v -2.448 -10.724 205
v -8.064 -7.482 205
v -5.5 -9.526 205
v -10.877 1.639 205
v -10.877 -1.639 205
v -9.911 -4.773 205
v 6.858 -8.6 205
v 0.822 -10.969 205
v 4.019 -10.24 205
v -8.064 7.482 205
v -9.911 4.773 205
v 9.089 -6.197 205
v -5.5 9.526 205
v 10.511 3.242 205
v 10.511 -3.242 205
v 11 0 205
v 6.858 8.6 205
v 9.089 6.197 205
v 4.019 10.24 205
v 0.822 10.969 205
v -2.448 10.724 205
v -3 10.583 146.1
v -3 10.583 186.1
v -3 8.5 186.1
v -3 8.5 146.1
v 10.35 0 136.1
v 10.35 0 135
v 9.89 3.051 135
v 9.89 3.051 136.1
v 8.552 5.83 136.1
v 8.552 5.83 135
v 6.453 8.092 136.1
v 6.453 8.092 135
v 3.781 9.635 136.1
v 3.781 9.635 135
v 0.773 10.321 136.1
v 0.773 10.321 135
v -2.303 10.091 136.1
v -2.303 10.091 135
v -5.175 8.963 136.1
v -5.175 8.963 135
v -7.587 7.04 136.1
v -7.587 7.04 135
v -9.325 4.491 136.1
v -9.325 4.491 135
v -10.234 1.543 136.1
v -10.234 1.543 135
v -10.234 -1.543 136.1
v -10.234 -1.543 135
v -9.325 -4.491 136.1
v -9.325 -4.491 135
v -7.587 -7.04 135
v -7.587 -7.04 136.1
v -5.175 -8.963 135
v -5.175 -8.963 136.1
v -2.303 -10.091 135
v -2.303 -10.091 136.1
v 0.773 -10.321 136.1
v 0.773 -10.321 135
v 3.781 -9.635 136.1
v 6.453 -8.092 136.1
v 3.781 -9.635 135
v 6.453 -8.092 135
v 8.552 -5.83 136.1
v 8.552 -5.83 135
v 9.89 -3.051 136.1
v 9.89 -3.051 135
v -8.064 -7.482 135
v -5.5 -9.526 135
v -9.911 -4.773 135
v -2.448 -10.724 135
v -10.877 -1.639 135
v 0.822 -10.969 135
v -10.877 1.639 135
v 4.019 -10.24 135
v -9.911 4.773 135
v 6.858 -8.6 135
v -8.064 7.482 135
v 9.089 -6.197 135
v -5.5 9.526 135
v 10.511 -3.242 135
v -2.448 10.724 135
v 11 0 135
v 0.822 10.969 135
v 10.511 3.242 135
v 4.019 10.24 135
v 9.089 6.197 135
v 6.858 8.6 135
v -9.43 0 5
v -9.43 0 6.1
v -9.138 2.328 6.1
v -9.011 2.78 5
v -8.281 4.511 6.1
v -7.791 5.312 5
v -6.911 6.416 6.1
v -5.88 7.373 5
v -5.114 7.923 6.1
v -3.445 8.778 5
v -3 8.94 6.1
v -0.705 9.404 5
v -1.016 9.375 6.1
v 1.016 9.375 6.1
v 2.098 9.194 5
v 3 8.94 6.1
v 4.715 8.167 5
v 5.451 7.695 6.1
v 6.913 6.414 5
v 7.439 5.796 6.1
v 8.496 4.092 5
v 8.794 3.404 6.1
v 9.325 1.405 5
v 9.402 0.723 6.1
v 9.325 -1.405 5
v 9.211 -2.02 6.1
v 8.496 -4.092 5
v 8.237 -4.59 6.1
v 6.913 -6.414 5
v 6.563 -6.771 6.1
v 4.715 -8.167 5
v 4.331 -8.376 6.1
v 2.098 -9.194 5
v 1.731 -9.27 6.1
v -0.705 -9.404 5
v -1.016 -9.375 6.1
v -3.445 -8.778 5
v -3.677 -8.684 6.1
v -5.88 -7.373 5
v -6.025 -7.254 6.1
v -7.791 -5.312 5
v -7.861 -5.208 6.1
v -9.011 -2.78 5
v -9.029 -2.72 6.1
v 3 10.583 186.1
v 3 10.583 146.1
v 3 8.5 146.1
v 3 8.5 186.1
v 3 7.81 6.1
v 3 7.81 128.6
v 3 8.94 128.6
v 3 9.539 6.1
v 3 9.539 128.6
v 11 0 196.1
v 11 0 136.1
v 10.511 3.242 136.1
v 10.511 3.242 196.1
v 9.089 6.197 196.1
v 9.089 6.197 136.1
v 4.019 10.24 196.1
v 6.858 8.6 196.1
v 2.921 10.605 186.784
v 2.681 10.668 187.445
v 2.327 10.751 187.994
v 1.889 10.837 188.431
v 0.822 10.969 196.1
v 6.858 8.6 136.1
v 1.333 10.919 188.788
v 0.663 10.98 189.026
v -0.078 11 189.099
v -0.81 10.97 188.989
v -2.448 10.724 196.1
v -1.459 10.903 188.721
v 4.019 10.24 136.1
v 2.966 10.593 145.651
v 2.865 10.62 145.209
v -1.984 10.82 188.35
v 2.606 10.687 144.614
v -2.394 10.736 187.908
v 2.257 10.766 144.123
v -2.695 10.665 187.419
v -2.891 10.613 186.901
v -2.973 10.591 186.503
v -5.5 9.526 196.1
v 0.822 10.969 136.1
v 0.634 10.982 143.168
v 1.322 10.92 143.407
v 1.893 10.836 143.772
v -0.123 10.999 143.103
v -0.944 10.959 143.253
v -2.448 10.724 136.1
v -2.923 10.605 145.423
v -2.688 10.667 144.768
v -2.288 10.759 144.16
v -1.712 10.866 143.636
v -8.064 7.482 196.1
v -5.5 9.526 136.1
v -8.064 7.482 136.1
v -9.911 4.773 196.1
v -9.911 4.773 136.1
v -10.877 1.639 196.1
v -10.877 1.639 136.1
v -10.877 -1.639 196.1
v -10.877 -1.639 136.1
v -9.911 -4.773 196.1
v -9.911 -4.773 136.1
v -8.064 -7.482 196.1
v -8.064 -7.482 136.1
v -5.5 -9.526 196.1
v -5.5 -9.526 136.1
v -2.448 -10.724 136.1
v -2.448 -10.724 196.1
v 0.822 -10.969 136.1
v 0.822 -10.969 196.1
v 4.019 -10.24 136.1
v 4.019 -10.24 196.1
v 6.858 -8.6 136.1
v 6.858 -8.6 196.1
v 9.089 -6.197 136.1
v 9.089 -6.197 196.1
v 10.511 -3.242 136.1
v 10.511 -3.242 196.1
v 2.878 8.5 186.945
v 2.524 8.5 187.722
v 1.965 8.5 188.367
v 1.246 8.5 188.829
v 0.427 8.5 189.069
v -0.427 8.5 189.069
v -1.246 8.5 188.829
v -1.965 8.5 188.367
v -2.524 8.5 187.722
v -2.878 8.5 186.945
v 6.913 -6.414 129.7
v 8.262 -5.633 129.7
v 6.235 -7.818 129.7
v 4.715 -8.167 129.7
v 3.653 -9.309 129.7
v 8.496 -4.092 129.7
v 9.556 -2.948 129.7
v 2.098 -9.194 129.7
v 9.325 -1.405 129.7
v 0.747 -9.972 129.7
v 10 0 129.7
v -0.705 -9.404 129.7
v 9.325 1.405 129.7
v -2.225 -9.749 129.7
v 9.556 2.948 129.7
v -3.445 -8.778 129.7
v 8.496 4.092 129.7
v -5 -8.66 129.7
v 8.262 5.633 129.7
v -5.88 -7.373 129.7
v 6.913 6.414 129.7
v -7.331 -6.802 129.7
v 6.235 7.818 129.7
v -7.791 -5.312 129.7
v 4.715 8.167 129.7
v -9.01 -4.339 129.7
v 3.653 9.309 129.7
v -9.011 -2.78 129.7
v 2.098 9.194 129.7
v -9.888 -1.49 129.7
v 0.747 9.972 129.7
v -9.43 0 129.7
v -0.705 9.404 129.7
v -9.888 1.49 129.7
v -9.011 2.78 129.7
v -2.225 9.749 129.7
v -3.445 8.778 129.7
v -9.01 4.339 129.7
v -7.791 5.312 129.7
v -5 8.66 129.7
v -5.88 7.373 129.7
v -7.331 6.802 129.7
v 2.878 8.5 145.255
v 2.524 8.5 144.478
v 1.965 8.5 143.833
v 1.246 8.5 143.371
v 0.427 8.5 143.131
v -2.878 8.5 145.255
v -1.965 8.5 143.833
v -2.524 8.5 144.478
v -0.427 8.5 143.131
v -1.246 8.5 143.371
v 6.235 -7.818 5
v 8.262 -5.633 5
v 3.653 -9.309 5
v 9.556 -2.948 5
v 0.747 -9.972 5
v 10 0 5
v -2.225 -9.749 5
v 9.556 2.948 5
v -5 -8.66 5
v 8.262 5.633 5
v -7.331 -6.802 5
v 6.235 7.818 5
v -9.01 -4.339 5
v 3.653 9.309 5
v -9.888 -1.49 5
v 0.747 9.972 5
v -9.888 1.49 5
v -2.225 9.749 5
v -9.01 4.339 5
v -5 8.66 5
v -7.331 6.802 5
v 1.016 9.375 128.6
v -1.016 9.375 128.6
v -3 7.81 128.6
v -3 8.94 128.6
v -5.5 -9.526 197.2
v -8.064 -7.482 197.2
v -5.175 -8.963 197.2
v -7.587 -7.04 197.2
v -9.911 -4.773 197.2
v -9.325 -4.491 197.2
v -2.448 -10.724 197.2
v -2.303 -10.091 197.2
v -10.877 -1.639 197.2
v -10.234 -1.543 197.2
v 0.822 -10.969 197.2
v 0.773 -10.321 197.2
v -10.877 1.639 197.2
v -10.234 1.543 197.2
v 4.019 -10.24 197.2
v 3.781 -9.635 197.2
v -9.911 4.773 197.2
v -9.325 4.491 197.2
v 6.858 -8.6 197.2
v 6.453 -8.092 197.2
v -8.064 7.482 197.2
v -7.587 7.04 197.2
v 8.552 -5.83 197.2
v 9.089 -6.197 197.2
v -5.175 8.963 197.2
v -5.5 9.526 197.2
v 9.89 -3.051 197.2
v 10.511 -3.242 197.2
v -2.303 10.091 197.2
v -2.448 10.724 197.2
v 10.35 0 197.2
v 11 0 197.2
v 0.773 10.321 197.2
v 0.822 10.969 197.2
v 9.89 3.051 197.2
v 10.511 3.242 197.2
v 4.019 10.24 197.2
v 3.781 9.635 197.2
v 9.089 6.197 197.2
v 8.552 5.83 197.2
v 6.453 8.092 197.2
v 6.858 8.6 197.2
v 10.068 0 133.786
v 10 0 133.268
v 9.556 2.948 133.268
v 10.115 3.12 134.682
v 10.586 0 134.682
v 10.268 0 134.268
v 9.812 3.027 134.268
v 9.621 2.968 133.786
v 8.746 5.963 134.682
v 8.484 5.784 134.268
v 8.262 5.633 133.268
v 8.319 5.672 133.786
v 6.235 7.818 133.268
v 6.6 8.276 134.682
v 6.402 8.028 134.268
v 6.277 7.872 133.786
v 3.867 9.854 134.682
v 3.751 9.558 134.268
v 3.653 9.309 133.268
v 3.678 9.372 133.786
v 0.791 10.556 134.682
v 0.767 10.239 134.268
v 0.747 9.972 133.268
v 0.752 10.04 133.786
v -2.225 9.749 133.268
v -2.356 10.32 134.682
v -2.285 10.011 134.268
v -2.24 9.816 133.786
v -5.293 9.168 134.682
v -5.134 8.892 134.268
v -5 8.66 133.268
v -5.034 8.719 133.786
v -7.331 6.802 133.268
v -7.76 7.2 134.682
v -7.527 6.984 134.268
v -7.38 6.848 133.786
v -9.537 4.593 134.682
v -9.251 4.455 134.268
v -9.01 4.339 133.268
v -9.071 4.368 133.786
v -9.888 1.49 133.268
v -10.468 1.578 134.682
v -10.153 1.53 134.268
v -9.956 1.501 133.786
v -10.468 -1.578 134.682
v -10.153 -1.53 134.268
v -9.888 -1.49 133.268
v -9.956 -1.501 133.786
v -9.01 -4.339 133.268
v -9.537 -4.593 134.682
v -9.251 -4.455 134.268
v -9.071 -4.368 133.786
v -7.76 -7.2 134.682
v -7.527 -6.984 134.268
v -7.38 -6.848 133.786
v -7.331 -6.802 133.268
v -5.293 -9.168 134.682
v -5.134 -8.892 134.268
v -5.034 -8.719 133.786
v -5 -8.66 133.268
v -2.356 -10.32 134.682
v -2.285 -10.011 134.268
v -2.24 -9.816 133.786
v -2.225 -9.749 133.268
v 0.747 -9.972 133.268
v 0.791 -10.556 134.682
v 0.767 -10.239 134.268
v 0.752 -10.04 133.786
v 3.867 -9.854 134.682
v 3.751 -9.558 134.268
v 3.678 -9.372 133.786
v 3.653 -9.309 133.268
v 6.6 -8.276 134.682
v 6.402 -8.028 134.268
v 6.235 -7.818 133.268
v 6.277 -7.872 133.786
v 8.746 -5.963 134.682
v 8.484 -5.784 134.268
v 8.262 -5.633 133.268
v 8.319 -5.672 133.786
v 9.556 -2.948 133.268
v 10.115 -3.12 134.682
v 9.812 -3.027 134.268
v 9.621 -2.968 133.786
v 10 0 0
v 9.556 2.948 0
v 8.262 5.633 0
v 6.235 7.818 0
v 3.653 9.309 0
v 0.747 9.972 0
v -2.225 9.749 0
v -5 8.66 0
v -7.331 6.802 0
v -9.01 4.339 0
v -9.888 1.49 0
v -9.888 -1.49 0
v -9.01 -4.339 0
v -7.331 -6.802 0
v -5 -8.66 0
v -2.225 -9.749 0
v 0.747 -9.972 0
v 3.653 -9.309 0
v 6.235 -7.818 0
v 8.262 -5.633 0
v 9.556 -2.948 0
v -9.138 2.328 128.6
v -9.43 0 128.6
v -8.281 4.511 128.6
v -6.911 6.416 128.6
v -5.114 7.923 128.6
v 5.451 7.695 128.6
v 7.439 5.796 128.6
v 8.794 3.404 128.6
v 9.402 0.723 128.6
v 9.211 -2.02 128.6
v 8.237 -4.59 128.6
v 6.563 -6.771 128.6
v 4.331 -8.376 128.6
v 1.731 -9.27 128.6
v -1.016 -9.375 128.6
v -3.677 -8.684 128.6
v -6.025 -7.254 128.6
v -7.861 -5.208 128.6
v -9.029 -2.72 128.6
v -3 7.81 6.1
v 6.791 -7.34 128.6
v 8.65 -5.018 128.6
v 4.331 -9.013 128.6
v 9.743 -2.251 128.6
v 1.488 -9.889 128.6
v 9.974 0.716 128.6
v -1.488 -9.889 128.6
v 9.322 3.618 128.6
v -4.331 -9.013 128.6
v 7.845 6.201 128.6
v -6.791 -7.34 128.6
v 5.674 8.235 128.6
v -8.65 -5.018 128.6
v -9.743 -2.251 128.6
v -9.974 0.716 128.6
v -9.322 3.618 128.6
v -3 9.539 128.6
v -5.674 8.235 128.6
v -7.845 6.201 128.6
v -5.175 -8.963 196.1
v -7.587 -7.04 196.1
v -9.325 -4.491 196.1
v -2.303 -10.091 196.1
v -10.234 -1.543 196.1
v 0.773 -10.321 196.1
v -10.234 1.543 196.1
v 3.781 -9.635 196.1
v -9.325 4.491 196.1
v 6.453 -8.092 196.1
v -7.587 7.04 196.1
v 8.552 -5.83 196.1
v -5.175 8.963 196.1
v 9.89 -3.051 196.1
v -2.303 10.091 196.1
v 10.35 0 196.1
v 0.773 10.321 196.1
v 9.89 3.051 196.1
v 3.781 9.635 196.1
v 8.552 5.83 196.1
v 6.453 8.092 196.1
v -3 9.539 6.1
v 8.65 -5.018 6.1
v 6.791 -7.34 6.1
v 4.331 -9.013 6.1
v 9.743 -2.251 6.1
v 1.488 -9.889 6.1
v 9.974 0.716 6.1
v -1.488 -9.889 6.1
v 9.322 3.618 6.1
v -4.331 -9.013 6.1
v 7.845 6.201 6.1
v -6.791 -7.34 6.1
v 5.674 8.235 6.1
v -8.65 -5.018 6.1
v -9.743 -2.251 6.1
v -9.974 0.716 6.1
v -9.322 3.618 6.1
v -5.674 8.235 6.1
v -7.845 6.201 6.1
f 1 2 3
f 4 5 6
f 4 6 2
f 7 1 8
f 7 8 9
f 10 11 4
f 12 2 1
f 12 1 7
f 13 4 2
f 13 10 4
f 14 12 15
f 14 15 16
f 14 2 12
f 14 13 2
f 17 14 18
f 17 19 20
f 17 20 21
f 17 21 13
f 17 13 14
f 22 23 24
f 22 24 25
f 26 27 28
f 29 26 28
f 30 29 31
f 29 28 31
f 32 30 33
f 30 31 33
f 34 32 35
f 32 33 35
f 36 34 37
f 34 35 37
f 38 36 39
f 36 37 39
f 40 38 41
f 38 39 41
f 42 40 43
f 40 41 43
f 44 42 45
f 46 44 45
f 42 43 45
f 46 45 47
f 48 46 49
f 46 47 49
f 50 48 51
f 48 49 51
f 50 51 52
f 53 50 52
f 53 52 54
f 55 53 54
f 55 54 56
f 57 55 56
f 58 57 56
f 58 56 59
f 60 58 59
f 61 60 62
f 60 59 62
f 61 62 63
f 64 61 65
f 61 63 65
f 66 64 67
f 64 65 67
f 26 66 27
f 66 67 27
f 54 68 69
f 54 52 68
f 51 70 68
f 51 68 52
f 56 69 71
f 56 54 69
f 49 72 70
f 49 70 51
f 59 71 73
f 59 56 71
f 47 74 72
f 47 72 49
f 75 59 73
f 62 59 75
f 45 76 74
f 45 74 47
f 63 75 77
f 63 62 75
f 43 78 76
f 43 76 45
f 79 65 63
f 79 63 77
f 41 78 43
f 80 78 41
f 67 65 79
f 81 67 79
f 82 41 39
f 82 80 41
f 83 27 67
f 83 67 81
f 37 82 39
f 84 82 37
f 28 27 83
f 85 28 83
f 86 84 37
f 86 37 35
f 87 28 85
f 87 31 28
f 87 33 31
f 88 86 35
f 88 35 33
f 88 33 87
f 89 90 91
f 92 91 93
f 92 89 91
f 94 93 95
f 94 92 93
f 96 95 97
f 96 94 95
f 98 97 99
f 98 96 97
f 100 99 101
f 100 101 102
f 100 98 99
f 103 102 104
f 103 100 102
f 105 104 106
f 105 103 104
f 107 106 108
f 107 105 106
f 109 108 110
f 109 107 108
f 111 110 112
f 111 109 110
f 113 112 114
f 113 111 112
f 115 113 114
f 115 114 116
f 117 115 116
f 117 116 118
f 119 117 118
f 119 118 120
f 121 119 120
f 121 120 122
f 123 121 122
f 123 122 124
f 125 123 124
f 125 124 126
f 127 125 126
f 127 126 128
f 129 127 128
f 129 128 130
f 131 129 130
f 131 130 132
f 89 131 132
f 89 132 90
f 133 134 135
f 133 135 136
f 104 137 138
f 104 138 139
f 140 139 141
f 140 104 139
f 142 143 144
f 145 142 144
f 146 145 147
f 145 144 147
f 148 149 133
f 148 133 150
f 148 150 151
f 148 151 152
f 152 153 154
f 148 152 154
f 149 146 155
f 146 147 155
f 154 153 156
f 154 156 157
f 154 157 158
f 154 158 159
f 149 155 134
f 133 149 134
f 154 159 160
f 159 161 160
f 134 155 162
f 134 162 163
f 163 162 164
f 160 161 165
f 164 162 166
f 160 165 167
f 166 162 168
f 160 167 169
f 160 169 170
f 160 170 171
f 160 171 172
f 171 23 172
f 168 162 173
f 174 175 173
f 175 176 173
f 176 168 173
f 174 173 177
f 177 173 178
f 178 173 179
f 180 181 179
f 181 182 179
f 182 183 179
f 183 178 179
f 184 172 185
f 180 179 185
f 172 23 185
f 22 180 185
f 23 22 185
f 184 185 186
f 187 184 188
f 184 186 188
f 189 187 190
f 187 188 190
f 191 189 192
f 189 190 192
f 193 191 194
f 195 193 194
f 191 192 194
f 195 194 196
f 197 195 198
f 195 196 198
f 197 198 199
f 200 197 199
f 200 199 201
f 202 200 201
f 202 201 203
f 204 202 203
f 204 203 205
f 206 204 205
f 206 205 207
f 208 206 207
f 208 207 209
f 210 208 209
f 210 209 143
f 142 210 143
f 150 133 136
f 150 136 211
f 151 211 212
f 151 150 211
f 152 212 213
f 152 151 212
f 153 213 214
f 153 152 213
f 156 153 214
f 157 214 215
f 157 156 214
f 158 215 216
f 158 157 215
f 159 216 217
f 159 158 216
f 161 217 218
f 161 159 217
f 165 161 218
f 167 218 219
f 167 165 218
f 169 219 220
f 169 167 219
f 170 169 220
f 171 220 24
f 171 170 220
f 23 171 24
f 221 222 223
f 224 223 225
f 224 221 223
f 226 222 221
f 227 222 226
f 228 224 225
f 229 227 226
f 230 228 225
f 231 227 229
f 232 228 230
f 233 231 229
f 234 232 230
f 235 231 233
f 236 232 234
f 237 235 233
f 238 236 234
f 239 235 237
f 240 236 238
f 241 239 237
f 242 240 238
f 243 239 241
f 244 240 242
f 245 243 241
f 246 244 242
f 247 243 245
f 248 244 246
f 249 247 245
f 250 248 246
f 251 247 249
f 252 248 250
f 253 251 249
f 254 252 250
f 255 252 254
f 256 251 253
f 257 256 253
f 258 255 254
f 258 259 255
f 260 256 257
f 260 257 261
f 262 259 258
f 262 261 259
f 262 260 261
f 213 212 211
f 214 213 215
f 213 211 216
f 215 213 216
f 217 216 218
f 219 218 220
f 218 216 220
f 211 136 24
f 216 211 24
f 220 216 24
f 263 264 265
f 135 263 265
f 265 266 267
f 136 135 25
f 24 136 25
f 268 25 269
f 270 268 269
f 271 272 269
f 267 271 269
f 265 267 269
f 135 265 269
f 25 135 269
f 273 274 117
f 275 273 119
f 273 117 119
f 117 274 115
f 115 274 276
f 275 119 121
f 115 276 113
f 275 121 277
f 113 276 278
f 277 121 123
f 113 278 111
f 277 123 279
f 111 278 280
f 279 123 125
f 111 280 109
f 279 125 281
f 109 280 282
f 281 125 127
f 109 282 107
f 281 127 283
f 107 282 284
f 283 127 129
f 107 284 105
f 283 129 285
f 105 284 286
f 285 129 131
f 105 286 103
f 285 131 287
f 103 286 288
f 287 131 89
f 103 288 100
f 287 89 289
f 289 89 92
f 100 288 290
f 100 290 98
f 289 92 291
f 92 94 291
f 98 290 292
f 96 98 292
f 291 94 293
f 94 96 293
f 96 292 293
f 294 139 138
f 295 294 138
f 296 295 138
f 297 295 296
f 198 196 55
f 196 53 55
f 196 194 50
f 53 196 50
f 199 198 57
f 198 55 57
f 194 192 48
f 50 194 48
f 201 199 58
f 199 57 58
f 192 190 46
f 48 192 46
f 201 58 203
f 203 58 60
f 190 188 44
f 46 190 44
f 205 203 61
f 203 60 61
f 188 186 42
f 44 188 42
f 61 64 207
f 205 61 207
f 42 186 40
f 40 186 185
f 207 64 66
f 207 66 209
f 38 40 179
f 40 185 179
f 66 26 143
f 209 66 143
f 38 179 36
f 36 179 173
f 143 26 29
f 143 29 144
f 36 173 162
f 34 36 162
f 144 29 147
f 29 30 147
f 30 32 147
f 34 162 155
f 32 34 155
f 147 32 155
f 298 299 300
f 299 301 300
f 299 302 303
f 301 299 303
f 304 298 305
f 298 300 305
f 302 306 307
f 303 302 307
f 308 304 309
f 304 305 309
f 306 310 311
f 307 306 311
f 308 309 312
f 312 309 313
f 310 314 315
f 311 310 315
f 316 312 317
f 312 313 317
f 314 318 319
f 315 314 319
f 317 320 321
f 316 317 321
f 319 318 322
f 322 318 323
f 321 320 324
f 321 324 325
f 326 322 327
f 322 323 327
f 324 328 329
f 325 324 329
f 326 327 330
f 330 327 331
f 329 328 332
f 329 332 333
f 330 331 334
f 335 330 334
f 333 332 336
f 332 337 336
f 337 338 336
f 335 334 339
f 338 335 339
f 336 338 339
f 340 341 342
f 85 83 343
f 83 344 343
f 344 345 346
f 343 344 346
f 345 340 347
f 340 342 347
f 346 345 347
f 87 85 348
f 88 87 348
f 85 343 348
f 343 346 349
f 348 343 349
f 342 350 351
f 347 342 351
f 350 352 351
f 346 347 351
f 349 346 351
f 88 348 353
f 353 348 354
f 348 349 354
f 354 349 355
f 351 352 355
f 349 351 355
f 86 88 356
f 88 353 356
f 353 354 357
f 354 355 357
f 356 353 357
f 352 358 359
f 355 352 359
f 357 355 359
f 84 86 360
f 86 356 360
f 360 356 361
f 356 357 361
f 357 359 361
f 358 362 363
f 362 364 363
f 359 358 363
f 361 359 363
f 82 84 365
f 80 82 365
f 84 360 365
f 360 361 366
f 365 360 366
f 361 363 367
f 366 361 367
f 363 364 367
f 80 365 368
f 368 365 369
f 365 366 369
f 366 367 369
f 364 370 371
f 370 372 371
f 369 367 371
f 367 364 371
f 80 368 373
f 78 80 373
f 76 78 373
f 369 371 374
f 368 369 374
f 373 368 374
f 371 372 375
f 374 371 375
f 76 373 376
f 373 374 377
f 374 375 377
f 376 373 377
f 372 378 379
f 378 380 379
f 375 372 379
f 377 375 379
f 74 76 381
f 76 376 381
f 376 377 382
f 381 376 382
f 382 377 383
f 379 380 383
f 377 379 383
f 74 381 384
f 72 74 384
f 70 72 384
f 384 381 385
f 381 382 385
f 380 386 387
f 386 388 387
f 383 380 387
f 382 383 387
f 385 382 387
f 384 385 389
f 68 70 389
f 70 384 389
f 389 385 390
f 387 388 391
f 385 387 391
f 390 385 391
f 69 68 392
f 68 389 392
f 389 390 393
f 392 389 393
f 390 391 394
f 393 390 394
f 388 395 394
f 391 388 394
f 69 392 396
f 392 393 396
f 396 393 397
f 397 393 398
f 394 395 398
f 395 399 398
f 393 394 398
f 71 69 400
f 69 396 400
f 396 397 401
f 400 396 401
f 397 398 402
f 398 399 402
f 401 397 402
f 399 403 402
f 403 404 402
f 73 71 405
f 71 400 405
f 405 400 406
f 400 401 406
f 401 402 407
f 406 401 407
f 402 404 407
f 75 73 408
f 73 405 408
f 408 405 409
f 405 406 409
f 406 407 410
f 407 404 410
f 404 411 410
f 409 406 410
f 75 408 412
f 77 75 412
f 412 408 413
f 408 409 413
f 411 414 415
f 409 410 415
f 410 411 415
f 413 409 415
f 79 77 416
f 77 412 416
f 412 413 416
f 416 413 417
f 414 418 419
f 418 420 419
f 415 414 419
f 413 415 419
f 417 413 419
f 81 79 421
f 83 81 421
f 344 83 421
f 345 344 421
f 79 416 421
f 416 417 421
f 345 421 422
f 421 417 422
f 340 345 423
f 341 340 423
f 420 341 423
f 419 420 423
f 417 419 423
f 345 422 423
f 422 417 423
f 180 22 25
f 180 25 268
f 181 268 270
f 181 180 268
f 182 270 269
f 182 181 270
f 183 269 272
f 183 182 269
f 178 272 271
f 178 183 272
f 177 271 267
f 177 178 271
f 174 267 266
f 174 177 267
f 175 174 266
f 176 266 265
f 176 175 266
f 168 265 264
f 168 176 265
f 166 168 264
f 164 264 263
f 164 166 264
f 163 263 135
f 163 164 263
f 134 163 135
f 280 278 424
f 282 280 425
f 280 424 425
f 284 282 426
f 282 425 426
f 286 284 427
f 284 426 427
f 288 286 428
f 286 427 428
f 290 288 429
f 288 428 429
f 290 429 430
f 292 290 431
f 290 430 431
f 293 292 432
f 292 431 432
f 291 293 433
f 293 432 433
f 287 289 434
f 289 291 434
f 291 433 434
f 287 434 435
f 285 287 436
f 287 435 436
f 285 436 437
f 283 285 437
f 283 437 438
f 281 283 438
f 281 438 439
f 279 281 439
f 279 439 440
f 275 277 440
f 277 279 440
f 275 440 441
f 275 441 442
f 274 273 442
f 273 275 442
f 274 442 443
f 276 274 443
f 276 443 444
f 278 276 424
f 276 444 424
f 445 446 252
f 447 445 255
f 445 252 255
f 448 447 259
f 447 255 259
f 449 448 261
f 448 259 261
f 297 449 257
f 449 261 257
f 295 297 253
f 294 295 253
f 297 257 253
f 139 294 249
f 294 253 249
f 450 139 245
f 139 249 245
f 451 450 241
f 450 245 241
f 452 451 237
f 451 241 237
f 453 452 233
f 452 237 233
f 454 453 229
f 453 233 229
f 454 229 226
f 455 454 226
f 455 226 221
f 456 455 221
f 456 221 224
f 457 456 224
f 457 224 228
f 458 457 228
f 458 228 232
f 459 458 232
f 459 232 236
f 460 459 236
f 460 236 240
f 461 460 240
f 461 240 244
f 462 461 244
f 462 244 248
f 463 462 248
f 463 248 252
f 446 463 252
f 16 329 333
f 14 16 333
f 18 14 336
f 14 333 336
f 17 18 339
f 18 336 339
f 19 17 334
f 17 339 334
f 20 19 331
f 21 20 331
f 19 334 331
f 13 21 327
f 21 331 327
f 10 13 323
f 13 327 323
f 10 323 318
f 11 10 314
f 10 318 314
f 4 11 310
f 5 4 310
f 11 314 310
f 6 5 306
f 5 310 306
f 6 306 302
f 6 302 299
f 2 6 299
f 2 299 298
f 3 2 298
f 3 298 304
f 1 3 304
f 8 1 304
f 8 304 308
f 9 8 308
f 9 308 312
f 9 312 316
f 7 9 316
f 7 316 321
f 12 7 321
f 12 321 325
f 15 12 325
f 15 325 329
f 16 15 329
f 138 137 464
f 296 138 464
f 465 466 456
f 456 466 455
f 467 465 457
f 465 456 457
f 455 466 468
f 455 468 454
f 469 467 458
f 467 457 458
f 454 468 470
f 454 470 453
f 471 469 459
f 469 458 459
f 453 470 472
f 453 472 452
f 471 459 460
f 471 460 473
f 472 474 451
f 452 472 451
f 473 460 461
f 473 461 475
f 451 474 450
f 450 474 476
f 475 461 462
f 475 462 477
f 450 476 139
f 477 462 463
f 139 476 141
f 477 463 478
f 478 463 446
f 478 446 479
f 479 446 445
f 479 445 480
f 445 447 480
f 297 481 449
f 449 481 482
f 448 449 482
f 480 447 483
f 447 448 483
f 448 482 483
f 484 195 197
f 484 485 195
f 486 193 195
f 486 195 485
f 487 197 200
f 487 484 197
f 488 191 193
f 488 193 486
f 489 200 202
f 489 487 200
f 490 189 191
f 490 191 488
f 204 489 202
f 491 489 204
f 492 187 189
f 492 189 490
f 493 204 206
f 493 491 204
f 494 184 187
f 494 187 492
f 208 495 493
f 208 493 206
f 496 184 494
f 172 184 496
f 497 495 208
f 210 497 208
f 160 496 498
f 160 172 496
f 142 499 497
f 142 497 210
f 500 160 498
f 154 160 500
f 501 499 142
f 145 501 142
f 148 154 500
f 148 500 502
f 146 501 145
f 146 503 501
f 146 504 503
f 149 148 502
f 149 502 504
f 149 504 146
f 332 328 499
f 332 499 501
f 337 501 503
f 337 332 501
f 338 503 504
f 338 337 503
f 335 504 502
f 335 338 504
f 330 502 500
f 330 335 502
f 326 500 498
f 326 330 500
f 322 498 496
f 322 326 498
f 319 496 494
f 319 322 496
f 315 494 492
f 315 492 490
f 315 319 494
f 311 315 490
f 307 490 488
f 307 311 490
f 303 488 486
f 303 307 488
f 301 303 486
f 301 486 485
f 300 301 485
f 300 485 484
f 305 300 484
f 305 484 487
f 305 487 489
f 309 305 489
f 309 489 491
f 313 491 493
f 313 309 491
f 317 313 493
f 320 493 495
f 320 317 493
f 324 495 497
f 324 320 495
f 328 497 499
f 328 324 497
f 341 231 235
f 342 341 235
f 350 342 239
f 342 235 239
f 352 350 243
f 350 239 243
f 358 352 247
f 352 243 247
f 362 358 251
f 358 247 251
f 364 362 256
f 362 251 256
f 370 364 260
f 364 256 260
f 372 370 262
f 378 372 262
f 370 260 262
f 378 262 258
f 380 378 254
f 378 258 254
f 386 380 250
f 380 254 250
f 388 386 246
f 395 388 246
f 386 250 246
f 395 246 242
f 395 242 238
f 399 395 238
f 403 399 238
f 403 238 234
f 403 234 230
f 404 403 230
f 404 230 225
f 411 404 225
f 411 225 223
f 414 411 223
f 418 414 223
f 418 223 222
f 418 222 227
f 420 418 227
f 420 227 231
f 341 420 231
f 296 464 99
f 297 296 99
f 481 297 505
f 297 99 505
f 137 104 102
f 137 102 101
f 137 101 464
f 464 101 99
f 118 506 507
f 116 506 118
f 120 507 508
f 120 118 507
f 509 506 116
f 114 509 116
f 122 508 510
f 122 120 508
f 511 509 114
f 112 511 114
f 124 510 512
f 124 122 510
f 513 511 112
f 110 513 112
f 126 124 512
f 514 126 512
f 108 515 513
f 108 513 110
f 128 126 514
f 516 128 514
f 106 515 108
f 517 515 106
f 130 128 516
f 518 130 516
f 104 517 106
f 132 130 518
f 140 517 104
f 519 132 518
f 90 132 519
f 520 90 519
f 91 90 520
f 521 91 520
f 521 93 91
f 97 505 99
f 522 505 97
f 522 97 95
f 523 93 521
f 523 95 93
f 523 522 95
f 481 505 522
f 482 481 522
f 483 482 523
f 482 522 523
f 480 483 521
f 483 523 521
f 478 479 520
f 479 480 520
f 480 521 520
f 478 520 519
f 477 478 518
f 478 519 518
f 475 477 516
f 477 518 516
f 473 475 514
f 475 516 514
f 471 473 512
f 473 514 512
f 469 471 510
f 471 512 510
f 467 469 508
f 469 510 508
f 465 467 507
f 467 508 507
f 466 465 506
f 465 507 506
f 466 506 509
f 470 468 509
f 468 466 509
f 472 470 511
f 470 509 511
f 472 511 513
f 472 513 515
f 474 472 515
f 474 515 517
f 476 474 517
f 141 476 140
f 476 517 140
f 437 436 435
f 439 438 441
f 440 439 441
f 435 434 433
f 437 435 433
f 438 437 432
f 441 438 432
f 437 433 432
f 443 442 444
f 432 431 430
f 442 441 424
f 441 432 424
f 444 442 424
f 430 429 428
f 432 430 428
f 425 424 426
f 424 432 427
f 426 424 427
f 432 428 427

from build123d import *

# Parameters (mm, degrees)
SKETCH2_R           = 10
BOSS_EXTRUDE1_DEPTH = 135
SKETCH3_R           = 10
SKETCH3_R_2         = 9.43
CUT_EXTRUDE2_DEPTH  = 1.1
SKETCH4_W           = 6
SKETCH4_H           = 3.067792635
CUT_EXTRUDE3_DEPTH  = 61.25
SKETCH5_R           = 11
BOSS_EXTRUDE2_DEPTH = 70
FILLET3_R           = 2
SKETCH6_R           = 11
SKETCH6_R_2         = 10.35
CUT_EXTRUDE4_DEPTH  = 1.1
CUT_EXTRUDE5_DEPTH  = 2.5


with BuildPart() as part:
    # Sketch2 → Boss-Extrude1 (new body)
    with BuildSketch(Plane.XY):
        Circle(SKETCH2_R)
    extrude(amount=BOSS_EXTRUDE1_DEPTH)

    # Sketch3 → Cut-Extrude2 (cut)
    with BuildSketch(Plane(origin=(0, 0, 5), x_dir=(-1, 0, 0), z_dir=(0, 0, -1))):
        Circle(SKETCH3_R)
        Circle(SKETCH3_R_2, mode=Mode.SUBTRACT)
    cut_extrude2 = extrude(amount=-CUT_EXTRUDE2_DEPTH, mode=Mode.SUBTRACT)

    # Mirror1: Cut-Extrude2 across plane
    add(cut_extrude2.mirror(Plane(origin=(0, 0, 67.35), x_dir=(1, 0, 0), z_dir=(0, 0, -1))), mode=Mode.SUBTRACT)

    # Sketch4 → Cut-Extrude3 (cut, symmetric)
    with BuildSketch(Plane(origin=(0, 0, 67.35), x_dir=(-1, 0, 0), z_dir=(0, 0, -1))):
        with Locations((0, 9.343896318)):
            Rectangle(SKETCH4_W, SKETCH4_H)
    extrude(amount=CUT_EXTRUDE3_DEPTH, both=True, mode=Mode.SUBTRACT)

    # Sketch5 → Boss-Extrude2 (add)
    with BuildSketch(Plane.XY.offset(135)):
        Circle(SKETCH5_R)
    extrude(amount=BOSS_EXTRUDE2_DEPTH)

    # Fillet3
    # the kernel refuses this fillet: 2 mm, written as the material it adds along each edge
    with BuildSketch(Plane(origin=(0, 0, 135), x_dir=(1, 0, 0), z_dir=(0, -1, 0))) as fillet3_piece_1:
        with BuildLine():
            CenterArc((12, -1.732050808), FILLET3_R, 120, 60)
            Line((10, -1.732050808), (9.96, -1.732050808))
            Line((9.96, -1.732050808), (9.96, 0))
            Line((9.96, 0), (10, 0.04))
            ThreePointArc((10, 0.04), (10.5, 0.04), (10.98, 0.034641016))
            Line((10.98, 0.034641016), (11, 0))
        make_face()
    revolve(axis=Axis((0, 0, 135), (0, 0, 1)))

    # Sketch6 → Cut-Extrude4 (cut)
    with BuildSketch(Plane.XY.offset(135)):
        Circle(SKETCH6_R)
        Circle(SKETCH6_R_2, mode=Mode.SUBTRACT)
    cut_extrude4 = extrude(amount=CUT_EXTRUDE4_DEPTH, mode=Mode.SUBTRACT)

    # Mirror2: Cut-Extrude4 across plane
    add(cut_extrude4.mirror(Plane.XY.offset(166.1)), mode=Mode.SUBTRACT)

    # Sketch8 → Cut-Extrude5 (cut)
    with BuildSketch(Plane(origin=(0, 11, 0), x_dir=(1, 0, 0), z_dir=(0, 1, 0))):
        with BuildLine():
            Line((3, -146.1), (3, -186.1))
            ThreePointArc((3, -186.1), (0, -189.1), (-3, -186.1))
            Line((-3, -186.1), (-3, -146.1))
            ThreePointArc((-3, -146.1), (0, -143.1), (3, -146.1))
        make_face()
    extrude(amount=-CUT_EXTRUDE5_DEPTH, mode=Mode.SUBTRACT)


solid = part.part
